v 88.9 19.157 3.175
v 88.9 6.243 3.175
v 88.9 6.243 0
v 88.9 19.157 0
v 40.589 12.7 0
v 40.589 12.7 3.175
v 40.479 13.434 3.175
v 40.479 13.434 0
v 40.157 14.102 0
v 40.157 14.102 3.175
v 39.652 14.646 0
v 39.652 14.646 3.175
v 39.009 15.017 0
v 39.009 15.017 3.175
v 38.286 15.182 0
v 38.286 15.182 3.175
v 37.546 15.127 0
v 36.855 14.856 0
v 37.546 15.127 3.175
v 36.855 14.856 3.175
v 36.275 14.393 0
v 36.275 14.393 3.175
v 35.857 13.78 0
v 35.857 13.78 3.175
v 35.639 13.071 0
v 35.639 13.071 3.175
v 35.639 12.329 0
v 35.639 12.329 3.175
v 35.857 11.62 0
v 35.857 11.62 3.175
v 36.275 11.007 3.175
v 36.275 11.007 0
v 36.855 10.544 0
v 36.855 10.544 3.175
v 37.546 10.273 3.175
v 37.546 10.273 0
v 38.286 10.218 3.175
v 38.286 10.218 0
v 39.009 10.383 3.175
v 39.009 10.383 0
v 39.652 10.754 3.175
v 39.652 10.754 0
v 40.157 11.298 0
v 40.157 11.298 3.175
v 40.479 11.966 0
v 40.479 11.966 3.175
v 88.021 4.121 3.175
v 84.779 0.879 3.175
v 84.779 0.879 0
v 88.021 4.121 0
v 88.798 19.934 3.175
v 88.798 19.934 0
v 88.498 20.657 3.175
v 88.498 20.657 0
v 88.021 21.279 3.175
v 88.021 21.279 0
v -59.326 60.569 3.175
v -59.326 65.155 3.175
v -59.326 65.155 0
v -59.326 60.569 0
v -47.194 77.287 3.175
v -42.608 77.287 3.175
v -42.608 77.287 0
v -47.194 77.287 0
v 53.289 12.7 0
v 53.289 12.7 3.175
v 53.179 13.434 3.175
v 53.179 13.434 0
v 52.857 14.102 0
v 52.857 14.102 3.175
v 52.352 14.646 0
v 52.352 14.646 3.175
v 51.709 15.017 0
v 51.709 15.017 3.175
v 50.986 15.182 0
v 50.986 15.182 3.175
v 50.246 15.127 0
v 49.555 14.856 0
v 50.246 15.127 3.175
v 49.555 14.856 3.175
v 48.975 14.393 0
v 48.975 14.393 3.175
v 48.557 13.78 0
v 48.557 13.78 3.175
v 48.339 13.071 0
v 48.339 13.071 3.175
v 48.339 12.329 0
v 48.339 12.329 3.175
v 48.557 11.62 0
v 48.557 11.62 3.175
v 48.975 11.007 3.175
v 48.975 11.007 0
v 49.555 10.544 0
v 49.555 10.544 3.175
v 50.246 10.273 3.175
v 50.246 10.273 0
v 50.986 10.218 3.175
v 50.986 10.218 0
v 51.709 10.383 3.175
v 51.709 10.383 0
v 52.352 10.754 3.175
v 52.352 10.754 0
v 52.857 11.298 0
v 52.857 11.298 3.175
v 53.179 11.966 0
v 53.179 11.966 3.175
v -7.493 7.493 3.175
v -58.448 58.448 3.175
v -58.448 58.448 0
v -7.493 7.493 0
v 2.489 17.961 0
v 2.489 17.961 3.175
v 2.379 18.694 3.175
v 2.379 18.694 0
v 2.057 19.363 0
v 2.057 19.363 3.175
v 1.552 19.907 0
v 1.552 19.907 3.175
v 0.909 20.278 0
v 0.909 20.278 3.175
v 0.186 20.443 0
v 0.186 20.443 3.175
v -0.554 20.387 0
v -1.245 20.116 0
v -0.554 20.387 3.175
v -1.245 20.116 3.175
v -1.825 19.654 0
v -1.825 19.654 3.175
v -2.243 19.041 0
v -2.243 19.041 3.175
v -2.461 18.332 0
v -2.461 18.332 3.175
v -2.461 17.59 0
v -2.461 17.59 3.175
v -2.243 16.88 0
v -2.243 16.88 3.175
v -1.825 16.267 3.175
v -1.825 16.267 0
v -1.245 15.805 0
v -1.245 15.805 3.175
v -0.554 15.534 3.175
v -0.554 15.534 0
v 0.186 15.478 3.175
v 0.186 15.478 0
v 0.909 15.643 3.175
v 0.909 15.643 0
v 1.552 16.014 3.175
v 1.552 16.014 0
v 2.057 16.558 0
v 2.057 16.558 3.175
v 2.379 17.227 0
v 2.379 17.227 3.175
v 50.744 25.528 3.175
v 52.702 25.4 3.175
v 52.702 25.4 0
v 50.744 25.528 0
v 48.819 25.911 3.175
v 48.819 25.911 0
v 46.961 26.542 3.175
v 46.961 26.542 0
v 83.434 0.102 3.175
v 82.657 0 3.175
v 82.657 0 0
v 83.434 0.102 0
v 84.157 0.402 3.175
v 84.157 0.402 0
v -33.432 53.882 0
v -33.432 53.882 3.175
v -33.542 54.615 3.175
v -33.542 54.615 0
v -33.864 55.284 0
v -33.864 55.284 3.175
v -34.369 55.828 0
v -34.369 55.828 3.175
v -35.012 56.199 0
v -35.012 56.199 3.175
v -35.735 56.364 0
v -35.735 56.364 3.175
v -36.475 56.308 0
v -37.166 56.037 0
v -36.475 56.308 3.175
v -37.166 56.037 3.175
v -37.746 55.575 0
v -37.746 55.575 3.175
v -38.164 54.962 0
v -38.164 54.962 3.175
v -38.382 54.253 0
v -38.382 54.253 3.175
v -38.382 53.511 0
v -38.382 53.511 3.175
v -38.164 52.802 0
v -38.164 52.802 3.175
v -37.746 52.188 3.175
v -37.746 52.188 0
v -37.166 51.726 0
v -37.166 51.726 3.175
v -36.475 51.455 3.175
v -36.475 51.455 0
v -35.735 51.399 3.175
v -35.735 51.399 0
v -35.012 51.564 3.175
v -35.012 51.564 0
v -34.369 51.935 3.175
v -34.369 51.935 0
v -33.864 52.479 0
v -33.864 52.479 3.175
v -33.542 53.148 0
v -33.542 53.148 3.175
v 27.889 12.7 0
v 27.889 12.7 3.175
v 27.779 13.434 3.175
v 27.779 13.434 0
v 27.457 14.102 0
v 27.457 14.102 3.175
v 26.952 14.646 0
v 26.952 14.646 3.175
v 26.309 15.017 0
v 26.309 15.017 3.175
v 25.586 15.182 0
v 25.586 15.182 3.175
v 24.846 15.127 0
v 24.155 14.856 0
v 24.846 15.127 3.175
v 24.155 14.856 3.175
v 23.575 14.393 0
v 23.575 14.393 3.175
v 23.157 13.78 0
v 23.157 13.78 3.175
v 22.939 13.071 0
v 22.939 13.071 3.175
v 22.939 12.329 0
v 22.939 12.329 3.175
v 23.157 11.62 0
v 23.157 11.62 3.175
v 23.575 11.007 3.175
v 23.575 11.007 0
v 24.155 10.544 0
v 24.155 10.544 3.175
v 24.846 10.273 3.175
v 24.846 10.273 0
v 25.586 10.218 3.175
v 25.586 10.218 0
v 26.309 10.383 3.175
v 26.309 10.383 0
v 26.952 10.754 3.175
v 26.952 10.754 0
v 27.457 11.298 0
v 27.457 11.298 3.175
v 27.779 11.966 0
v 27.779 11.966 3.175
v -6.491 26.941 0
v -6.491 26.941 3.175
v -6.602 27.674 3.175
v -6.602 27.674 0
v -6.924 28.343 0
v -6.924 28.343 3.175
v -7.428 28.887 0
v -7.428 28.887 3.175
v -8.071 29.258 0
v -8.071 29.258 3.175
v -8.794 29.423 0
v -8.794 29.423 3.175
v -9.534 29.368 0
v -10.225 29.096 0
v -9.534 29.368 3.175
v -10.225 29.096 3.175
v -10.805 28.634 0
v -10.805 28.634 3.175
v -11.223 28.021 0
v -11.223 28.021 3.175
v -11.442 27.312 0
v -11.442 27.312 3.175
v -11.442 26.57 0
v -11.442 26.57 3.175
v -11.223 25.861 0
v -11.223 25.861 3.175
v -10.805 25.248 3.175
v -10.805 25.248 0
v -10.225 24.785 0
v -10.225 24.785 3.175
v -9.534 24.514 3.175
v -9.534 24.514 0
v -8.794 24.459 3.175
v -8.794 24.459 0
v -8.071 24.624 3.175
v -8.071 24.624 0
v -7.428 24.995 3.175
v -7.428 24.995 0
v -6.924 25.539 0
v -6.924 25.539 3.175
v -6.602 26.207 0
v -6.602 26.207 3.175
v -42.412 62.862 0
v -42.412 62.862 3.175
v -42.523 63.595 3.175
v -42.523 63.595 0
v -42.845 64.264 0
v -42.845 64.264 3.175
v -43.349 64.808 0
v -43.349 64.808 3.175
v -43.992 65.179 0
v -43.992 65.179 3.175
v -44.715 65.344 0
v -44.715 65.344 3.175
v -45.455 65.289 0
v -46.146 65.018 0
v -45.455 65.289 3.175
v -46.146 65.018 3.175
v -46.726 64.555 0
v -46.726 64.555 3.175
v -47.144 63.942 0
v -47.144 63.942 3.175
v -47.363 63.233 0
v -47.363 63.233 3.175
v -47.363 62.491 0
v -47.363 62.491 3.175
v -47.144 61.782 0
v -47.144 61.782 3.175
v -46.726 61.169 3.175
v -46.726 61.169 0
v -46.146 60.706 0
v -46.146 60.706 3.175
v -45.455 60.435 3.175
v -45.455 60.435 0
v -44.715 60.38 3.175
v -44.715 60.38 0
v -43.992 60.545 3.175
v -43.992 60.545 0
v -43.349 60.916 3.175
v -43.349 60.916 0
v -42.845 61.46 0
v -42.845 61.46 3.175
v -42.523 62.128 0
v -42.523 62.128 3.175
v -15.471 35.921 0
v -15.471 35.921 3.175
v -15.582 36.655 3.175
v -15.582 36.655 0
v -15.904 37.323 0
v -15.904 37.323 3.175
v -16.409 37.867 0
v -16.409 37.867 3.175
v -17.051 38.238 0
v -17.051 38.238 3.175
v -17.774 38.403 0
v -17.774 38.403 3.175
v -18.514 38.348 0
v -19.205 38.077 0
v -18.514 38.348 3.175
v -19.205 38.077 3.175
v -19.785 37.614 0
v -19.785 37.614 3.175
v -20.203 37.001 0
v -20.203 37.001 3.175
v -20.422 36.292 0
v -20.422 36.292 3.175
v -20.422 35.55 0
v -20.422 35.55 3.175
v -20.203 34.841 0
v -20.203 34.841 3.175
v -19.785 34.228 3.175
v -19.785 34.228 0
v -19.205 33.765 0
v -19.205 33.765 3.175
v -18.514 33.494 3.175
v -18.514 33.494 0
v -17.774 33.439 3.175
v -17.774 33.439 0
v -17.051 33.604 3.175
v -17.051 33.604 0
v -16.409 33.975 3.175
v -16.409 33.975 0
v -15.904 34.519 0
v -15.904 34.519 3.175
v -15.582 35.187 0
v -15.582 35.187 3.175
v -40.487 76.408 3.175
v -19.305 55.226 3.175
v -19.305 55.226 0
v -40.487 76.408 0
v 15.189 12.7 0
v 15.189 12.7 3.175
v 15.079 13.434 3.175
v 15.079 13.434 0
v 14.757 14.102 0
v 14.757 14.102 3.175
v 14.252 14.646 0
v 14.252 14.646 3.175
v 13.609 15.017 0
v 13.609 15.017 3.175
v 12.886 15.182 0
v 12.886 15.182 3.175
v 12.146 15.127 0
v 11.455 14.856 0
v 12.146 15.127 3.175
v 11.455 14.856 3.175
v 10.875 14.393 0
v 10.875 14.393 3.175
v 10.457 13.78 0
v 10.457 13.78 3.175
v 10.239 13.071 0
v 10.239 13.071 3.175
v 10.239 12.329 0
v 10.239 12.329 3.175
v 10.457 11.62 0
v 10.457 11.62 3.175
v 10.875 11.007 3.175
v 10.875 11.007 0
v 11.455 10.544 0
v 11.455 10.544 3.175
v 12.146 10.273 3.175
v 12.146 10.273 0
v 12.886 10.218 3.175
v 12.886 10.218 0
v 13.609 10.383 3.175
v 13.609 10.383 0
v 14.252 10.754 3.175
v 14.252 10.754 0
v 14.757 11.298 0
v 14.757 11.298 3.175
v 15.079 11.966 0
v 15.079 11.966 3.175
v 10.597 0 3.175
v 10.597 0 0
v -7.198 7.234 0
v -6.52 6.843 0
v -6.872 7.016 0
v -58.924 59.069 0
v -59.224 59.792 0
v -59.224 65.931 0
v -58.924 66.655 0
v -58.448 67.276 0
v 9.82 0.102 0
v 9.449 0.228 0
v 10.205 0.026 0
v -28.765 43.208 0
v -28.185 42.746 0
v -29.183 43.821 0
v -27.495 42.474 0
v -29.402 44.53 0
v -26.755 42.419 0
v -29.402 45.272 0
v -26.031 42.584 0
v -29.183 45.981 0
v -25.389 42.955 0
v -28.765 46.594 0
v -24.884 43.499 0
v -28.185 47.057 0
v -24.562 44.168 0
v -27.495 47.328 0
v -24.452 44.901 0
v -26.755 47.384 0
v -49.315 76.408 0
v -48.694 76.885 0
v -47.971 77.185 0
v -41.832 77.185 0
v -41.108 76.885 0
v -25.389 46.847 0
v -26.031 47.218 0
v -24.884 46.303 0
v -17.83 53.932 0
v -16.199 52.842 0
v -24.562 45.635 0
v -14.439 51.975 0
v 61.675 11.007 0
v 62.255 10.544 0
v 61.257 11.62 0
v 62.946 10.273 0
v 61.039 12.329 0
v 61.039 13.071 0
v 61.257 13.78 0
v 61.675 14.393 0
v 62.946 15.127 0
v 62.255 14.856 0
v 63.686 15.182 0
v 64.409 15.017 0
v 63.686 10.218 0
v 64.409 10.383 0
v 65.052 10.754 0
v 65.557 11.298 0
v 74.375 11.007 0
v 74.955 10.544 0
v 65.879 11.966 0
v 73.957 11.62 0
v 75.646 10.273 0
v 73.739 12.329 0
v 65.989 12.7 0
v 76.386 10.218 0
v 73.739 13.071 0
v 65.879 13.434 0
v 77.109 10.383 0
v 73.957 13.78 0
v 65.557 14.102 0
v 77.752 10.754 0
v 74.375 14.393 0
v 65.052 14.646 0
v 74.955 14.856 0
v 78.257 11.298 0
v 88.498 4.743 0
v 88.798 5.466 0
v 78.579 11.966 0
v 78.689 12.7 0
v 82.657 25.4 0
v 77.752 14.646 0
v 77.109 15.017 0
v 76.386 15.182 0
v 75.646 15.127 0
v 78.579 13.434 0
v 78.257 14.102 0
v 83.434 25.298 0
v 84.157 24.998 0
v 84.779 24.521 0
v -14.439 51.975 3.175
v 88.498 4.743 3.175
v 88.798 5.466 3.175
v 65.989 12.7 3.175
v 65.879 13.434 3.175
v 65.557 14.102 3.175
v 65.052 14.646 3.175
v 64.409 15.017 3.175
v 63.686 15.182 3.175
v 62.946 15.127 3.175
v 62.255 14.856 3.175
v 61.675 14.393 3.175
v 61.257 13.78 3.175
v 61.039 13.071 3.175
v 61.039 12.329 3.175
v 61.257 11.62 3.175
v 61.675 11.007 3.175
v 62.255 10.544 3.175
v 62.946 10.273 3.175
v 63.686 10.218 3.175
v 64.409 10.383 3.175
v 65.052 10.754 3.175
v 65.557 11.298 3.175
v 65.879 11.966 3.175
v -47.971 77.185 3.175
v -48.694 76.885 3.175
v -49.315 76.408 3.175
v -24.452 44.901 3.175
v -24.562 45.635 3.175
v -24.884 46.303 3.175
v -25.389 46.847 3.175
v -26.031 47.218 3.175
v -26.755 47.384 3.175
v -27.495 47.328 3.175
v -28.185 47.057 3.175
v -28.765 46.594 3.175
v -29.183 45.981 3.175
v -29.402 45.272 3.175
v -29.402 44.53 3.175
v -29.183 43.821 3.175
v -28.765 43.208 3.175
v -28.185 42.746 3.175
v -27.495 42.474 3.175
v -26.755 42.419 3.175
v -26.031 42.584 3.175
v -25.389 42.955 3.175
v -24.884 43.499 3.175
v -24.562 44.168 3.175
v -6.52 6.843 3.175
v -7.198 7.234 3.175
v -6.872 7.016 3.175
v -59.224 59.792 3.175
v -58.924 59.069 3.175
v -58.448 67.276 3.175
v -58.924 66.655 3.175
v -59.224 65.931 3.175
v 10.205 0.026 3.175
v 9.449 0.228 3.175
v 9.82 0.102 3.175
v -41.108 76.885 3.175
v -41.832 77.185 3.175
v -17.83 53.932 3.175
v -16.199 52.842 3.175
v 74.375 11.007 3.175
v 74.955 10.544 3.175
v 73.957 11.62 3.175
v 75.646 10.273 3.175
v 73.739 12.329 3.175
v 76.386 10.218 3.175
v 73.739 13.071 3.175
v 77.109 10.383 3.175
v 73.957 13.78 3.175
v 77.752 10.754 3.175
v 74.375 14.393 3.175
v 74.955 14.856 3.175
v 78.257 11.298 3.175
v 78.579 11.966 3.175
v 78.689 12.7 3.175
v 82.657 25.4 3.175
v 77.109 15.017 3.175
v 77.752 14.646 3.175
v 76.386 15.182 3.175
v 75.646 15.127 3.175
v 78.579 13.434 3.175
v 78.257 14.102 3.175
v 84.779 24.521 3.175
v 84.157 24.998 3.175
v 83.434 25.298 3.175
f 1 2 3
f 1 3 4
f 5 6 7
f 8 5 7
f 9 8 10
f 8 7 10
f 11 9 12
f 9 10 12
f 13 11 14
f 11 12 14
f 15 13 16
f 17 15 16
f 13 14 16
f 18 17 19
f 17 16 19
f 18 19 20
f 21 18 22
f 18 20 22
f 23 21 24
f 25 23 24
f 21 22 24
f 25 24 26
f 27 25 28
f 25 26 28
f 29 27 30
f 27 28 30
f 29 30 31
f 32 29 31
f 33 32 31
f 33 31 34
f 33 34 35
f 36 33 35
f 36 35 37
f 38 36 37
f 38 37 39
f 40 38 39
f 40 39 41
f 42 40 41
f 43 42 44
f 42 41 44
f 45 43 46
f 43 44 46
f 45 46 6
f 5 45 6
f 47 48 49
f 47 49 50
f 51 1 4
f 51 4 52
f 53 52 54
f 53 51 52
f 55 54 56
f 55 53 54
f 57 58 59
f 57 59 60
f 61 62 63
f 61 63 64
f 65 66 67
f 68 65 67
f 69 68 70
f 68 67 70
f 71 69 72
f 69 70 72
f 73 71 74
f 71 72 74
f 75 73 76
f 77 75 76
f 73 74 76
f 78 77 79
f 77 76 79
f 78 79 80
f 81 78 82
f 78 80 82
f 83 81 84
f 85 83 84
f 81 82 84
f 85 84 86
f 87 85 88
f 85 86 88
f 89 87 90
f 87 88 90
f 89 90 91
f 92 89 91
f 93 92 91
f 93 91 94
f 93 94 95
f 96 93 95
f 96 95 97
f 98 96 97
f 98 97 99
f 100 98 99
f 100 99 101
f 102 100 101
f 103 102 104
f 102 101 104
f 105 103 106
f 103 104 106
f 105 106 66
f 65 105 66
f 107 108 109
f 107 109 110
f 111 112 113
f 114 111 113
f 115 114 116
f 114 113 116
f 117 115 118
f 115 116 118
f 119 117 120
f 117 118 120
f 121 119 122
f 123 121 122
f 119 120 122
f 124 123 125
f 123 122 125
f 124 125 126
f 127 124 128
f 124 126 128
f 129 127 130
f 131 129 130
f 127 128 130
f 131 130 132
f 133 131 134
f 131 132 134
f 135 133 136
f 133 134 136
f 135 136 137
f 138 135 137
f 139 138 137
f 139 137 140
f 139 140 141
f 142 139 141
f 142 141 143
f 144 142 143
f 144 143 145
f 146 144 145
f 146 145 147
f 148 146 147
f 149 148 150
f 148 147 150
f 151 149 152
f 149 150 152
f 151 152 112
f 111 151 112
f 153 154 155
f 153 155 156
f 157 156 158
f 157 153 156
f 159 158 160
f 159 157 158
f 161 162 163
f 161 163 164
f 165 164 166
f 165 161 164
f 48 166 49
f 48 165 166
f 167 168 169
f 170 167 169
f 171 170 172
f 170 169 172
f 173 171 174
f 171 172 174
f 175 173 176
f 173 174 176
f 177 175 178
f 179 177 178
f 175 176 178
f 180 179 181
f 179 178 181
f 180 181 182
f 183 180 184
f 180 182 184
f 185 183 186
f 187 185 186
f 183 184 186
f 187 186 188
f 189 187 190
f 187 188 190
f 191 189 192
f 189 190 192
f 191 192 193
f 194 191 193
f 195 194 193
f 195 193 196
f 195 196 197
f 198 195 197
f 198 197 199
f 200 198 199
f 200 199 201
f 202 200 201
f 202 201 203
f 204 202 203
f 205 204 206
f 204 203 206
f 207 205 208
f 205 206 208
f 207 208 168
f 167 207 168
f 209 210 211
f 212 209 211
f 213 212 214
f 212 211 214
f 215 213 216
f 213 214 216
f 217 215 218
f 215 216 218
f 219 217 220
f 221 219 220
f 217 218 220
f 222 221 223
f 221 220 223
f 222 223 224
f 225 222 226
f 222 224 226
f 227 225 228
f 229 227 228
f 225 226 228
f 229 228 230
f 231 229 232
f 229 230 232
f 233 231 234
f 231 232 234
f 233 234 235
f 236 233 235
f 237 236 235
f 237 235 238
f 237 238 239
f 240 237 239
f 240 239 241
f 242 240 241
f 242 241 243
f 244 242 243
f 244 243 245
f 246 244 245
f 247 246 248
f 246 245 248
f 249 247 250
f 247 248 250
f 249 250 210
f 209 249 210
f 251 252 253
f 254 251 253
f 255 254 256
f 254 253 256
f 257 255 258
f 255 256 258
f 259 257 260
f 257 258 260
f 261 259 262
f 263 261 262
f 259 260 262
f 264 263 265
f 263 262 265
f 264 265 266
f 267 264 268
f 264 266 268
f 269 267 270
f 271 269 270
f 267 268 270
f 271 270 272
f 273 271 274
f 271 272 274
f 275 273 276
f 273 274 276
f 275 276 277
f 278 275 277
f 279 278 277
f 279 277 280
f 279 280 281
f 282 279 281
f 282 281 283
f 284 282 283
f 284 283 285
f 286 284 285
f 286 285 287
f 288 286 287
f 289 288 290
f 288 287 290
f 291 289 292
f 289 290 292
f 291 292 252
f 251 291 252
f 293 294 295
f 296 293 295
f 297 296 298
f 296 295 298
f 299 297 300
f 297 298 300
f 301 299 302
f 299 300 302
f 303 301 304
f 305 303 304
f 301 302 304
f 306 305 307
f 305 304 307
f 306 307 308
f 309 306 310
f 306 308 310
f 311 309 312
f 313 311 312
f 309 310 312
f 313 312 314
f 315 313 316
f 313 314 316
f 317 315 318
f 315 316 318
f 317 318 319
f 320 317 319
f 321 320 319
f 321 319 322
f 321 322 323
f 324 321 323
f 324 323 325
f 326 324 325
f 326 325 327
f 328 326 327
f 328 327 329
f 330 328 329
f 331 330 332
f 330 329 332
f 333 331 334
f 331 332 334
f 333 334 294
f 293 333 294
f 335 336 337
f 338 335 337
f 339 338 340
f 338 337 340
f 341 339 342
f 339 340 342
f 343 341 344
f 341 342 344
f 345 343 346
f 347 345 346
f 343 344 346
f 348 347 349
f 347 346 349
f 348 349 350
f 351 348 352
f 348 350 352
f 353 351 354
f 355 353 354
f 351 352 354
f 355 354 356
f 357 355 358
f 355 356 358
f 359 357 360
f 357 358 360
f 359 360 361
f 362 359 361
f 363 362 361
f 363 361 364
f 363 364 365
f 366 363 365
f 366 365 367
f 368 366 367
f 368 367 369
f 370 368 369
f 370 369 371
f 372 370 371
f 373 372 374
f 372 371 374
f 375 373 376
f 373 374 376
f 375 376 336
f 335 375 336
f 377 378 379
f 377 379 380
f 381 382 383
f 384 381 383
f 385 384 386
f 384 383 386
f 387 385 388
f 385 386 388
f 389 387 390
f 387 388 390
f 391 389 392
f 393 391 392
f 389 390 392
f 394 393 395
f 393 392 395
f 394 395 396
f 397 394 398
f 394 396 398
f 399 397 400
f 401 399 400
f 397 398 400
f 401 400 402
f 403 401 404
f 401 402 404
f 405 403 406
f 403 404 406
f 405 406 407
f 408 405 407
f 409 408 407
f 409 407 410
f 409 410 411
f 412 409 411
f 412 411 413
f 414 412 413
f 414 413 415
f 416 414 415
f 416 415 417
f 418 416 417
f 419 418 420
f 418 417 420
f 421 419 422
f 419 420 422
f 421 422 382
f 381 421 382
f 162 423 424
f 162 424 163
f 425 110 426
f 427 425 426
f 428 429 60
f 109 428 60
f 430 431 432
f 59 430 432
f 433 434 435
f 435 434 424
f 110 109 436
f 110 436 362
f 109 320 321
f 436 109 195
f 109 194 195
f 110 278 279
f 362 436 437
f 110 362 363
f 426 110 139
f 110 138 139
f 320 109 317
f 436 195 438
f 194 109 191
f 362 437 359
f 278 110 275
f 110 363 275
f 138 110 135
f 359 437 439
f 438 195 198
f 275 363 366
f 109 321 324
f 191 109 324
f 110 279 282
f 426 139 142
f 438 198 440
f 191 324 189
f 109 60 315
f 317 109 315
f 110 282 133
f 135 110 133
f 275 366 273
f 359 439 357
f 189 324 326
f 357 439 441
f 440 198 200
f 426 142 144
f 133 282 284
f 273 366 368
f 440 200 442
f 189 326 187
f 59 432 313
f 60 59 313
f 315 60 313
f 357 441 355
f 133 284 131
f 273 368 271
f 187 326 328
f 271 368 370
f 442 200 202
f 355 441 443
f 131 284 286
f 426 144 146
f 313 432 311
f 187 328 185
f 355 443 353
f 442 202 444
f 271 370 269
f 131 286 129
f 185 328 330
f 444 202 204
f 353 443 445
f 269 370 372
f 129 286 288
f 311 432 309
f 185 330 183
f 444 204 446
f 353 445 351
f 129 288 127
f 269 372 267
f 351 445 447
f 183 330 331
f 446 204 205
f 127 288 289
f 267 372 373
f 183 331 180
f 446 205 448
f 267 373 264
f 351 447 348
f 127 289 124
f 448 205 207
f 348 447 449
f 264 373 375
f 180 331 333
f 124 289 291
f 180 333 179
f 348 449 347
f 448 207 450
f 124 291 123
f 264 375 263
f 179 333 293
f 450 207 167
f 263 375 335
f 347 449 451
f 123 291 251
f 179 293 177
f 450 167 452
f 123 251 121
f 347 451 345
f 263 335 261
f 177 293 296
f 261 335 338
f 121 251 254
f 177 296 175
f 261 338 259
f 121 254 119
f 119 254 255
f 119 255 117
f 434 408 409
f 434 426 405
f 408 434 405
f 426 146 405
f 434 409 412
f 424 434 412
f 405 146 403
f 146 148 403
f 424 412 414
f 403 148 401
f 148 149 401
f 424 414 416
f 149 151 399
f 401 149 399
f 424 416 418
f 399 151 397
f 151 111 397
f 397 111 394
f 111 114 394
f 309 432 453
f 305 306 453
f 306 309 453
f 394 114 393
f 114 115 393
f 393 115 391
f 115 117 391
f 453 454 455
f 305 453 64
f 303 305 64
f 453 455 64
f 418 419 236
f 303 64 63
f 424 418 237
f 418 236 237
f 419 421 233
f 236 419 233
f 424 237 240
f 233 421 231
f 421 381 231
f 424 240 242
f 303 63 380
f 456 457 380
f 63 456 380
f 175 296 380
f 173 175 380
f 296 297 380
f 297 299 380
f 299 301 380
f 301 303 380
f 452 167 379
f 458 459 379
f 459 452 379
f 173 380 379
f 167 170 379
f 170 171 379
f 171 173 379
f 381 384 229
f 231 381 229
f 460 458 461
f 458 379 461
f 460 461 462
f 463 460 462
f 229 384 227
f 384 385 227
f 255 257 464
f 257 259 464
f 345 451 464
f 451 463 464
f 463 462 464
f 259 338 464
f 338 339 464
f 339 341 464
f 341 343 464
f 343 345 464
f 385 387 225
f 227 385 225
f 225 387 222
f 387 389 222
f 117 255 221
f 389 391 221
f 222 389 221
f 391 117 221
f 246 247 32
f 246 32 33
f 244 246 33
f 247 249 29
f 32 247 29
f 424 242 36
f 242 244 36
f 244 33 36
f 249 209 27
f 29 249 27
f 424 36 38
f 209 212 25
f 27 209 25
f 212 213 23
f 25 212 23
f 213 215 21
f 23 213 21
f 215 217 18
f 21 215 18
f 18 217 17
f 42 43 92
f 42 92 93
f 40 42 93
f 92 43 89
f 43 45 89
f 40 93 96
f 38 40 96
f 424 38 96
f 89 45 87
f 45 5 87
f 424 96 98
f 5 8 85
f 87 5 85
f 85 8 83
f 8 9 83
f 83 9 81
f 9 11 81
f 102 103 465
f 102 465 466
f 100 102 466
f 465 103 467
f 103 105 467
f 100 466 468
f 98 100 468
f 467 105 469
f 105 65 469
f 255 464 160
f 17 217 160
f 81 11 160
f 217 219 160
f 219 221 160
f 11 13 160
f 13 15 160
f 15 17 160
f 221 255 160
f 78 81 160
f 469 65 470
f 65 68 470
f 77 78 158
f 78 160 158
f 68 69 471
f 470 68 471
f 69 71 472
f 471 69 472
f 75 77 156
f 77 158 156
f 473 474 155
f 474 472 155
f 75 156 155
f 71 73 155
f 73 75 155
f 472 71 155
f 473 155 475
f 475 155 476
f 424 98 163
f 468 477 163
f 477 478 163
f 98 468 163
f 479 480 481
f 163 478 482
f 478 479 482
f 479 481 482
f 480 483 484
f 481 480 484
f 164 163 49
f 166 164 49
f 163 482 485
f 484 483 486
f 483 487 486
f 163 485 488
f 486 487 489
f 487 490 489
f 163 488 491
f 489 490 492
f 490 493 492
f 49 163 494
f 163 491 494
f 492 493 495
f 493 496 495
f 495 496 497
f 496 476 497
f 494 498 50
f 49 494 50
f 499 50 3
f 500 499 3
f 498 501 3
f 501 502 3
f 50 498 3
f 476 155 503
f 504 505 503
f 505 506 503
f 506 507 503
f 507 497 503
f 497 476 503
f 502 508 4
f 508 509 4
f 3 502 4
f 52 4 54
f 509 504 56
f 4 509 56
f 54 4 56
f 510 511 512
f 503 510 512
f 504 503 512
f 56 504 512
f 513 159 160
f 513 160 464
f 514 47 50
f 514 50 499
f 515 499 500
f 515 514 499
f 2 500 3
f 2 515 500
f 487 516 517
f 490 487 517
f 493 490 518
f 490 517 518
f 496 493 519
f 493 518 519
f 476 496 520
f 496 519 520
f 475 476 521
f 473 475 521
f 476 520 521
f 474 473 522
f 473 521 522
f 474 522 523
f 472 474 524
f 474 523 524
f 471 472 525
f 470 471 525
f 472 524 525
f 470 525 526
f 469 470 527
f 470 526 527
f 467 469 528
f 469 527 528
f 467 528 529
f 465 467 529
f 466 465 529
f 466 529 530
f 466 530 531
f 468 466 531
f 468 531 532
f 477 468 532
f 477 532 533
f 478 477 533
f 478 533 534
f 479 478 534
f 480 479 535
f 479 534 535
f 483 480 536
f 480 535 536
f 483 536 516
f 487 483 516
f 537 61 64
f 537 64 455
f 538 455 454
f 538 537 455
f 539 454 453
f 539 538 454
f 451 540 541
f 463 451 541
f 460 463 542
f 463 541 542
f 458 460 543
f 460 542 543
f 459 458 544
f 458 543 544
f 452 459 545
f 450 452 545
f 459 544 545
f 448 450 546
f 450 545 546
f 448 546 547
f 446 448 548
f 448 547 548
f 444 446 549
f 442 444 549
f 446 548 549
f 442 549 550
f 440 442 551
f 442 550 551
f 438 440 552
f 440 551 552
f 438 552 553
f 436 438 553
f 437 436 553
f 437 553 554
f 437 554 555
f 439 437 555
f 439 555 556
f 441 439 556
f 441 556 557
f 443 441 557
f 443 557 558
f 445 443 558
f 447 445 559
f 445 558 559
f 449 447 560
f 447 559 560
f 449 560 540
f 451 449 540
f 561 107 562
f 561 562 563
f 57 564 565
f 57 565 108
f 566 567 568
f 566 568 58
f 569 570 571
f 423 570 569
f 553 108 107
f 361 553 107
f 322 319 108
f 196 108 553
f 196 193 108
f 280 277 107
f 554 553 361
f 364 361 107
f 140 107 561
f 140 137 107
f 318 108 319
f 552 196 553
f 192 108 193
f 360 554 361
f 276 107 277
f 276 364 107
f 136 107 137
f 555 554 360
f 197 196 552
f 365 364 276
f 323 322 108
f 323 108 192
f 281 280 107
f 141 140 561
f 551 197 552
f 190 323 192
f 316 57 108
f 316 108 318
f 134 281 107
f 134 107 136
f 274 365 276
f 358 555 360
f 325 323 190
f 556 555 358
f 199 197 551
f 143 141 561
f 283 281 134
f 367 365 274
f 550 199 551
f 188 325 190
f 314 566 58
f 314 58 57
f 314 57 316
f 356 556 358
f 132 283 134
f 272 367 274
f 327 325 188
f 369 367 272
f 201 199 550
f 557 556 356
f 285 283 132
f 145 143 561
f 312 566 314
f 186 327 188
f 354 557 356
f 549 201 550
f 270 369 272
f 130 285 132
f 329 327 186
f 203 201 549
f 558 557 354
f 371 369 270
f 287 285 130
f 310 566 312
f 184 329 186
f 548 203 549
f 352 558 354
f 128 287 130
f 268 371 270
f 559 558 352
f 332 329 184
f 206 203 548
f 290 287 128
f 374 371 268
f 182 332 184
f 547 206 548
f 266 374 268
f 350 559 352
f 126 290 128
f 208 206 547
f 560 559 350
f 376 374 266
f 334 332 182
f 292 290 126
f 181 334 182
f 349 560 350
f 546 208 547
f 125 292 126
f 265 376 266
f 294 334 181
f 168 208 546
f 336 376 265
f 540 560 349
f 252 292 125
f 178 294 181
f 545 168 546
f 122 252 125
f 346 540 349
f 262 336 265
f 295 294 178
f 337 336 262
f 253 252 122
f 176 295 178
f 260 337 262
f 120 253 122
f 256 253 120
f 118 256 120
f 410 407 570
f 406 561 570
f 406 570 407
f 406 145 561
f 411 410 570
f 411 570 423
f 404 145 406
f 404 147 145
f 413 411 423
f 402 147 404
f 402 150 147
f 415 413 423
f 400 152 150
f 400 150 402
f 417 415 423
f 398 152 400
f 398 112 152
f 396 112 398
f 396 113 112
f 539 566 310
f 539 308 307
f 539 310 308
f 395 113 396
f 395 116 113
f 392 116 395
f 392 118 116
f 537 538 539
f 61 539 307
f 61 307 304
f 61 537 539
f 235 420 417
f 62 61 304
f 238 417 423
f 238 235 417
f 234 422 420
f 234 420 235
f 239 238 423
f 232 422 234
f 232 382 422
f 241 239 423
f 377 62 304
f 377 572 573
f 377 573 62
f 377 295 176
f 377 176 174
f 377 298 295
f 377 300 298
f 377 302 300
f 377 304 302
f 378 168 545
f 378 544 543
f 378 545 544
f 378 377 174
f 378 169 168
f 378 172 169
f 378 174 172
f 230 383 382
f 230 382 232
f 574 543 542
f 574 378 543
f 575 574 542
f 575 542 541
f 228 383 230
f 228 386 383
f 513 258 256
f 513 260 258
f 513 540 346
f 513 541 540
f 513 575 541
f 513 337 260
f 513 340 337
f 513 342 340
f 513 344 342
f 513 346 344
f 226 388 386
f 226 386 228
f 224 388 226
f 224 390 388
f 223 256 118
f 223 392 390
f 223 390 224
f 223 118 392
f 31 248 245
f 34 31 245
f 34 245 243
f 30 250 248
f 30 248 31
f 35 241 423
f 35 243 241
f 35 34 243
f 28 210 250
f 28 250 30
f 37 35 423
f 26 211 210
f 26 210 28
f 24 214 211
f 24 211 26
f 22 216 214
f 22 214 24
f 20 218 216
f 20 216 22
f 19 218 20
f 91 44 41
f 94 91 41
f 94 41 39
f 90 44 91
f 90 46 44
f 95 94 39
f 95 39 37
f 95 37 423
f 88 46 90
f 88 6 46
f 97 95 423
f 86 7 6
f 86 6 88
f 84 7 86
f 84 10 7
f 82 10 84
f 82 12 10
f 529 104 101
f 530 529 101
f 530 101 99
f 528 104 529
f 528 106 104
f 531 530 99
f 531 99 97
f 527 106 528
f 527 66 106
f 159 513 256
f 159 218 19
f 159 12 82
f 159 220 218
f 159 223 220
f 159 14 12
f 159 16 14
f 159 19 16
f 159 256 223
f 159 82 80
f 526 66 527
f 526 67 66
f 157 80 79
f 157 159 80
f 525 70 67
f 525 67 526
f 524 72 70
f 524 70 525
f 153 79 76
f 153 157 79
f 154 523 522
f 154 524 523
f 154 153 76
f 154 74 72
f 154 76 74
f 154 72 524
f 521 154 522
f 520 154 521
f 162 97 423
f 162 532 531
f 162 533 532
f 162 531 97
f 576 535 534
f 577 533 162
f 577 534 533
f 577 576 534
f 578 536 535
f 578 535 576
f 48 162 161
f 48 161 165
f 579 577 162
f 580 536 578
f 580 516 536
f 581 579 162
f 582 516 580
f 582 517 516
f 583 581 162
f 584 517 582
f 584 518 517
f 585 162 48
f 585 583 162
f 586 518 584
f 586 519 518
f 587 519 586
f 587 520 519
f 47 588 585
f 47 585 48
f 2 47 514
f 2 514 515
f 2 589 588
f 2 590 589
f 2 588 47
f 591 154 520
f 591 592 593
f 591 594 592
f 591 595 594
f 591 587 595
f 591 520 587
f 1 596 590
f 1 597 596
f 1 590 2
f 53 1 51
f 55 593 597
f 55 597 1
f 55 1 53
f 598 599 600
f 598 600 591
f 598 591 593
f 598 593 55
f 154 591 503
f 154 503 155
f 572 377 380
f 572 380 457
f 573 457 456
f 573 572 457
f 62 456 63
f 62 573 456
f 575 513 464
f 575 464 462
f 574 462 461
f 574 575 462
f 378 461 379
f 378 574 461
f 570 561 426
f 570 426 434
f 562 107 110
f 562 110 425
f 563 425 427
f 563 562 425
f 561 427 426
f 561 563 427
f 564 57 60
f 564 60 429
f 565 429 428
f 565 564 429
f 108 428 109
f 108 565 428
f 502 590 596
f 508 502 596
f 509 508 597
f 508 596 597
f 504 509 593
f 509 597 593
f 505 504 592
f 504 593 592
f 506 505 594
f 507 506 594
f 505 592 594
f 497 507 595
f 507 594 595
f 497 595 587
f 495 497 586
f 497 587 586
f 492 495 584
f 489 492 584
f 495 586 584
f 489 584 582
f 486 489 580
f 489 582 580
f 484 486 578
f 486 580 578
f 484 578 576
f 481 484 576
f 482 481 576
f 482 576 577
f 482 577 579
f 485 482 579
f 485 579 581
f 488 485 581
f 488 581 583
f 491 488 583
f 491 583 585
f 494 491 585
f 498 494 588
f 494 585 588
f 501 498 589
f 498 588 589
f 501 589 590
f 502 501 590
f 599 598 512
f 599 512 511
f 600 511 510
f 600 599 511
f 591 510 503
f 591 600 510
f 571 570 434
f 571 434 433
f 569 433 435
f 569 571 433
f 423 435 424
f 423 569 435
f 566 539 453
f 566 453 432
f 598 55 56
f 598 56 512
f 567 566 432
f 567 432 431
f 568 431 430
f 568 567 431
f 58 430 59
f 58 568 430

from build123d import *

# Parameters (mm, degrees)
SKETCH1_R           = 2.4892
BOSS_EXTRUDE1_DEPTH = 3.175


with BuildPart() as part:
    # Sketch1 → Boss-Extrude1 (new body)
    with BuildSketch(Plane.XY.offset(3.175)):
        with BuildLine():
            Line((-6.519754617, 6.842706409), (9.448686805, 0.228361402))
            ThreePointArc((9.448686805, 0.228361402), (10.011466136, 0.057644159), (10.596737102, 0))
            Line((10.596737102, 0), (82.657359313, 0))
            ThreePointArc((82.657359313, 0), (83.80540961, 0.228361402), (84.778679656, 0.878679656))
            Line((84.778679656, 0.878679656), (88.021320344, 4.121320344))
            ThreePointArc((88.021320344, 4.121320344), (88.671638598, 5.09459039), (88.9, 6.242640687))
            Line((88.9, 6.242640687), (88.9, 19.157359313))
            ThreePointArc((88.9, 19.157359313), (88.671638598, 20.30540961), (88.021320344, 21.278679656))
            Line((88.021320344, 21.278679656), (84.778679656, 24.521320344))
            ThreePointArc((84.778679656, 24.521320344), (83.80540961, 25.171638598), (82.657359313, 25.4))
            Line((82.657359313, 25.4), (52.701598941, 25.4))
            ThreePointArc((52.701598941, 25.4), (49.775244111, 25.688220794), (46.961347456, 26.541807012))
            Line((46.961347456, 26.541807012), (-14.438795516, 51.974578963))
            ThreePointArc((-14.438795516, 51.974578963), (-17.032097526, 53.360727766), (-19.305145749, 55.226170233))
            Line((-19.305145749, 55.226170233), (-40.487067043, 76.408091527))
            ThreePointArc((-40.487067043, 76.408091527), (-41.460337089, 77.058409781), (-42.608387387, 77.286771184))
            Line((-42.608387387, 77.286771184), (-47.194173824, 77.286771184))
            ThreePointArc((-47.194173824, 77.286771184), (-48.342224121, 77.058409781), (-49.315494168, 76.408091527))
            Line((-49.315494168, 76.408091527), (-58.447579285, 67.27600641))
            ThreePointArc((-58.447579285, 67.27600641), (-59.097897539, 66.302736363), (-59.326258942, 65.154686066))
            Line((-59.326258942, 65.154686066), (-59.326258942, 60.568899629))
            ThreePointArc((-59.326258942, 60.568899629), (-59.097897539, 59.420849332), (-58.447579285, 58.447579285))
            Line((-58.447579285, 58.447579285), (-7.493024663, 7.493024663))
            ThreePointArc((-7.493024663, 7.493024663), (-7.038415019, 7.11993617), (-6.519754617, 6.842706409))
        make_face()
        with Locations((0, 17.960512242)):
            Circle(SKETCH1_R, mode=Mode.SUBTRACT)
        with Locations((12.7, 12.7)):
            Circle(SKETCH1_R, mode=Mode.SUBTRACT)
        with Locations((63.5, 12.7)):
            Circle(SKETCH1_R, mode=Mode.SUBTRACT)
        with Locations((38.1, 12.7)):
            Circle(SKETCH1_R, mode=Mode.SUBTRACT)
        with Locations((-17.960512242, 35.921024484)):
            Circle(SKETCH1_R, mode=Mode.SUBTRACT)
        with Locations((-35.921024484, 53.881536726)):
            Circle(SKETCH1_R, mode=Mode.SUBTRACT)
        with Locations((76.2, 12.7)):
            Circle(SKETCH1_R, mode=Mode.SUBTRACT)
        with Locations((50.8, 12.7)):
            Circle(SKETCH1_R, mode=Mode.SUBTRACT)
        with Locations((25.4, 12.7)):
            Circle(SKETCH1_R, mode=Mode.SUBTRACT)
        with Locations((-8.980256121, 26.940768363)):
            Circle(SKETCH1_R, mode=Mode.SUBTRACT)
        with Locations((-26.940768363, 44.901280605)):
            Circle(SKETCH1_R, mode=Mode.SUBTRACT)
        with Locations((-44.901280605, 62.861792847)):
            Circle(SKETCH1_R, mode=Mode.SUBTRACT)
    extrude(amount=-BOSS_EXTRUDE1_DEPTH)


solid = part.part
